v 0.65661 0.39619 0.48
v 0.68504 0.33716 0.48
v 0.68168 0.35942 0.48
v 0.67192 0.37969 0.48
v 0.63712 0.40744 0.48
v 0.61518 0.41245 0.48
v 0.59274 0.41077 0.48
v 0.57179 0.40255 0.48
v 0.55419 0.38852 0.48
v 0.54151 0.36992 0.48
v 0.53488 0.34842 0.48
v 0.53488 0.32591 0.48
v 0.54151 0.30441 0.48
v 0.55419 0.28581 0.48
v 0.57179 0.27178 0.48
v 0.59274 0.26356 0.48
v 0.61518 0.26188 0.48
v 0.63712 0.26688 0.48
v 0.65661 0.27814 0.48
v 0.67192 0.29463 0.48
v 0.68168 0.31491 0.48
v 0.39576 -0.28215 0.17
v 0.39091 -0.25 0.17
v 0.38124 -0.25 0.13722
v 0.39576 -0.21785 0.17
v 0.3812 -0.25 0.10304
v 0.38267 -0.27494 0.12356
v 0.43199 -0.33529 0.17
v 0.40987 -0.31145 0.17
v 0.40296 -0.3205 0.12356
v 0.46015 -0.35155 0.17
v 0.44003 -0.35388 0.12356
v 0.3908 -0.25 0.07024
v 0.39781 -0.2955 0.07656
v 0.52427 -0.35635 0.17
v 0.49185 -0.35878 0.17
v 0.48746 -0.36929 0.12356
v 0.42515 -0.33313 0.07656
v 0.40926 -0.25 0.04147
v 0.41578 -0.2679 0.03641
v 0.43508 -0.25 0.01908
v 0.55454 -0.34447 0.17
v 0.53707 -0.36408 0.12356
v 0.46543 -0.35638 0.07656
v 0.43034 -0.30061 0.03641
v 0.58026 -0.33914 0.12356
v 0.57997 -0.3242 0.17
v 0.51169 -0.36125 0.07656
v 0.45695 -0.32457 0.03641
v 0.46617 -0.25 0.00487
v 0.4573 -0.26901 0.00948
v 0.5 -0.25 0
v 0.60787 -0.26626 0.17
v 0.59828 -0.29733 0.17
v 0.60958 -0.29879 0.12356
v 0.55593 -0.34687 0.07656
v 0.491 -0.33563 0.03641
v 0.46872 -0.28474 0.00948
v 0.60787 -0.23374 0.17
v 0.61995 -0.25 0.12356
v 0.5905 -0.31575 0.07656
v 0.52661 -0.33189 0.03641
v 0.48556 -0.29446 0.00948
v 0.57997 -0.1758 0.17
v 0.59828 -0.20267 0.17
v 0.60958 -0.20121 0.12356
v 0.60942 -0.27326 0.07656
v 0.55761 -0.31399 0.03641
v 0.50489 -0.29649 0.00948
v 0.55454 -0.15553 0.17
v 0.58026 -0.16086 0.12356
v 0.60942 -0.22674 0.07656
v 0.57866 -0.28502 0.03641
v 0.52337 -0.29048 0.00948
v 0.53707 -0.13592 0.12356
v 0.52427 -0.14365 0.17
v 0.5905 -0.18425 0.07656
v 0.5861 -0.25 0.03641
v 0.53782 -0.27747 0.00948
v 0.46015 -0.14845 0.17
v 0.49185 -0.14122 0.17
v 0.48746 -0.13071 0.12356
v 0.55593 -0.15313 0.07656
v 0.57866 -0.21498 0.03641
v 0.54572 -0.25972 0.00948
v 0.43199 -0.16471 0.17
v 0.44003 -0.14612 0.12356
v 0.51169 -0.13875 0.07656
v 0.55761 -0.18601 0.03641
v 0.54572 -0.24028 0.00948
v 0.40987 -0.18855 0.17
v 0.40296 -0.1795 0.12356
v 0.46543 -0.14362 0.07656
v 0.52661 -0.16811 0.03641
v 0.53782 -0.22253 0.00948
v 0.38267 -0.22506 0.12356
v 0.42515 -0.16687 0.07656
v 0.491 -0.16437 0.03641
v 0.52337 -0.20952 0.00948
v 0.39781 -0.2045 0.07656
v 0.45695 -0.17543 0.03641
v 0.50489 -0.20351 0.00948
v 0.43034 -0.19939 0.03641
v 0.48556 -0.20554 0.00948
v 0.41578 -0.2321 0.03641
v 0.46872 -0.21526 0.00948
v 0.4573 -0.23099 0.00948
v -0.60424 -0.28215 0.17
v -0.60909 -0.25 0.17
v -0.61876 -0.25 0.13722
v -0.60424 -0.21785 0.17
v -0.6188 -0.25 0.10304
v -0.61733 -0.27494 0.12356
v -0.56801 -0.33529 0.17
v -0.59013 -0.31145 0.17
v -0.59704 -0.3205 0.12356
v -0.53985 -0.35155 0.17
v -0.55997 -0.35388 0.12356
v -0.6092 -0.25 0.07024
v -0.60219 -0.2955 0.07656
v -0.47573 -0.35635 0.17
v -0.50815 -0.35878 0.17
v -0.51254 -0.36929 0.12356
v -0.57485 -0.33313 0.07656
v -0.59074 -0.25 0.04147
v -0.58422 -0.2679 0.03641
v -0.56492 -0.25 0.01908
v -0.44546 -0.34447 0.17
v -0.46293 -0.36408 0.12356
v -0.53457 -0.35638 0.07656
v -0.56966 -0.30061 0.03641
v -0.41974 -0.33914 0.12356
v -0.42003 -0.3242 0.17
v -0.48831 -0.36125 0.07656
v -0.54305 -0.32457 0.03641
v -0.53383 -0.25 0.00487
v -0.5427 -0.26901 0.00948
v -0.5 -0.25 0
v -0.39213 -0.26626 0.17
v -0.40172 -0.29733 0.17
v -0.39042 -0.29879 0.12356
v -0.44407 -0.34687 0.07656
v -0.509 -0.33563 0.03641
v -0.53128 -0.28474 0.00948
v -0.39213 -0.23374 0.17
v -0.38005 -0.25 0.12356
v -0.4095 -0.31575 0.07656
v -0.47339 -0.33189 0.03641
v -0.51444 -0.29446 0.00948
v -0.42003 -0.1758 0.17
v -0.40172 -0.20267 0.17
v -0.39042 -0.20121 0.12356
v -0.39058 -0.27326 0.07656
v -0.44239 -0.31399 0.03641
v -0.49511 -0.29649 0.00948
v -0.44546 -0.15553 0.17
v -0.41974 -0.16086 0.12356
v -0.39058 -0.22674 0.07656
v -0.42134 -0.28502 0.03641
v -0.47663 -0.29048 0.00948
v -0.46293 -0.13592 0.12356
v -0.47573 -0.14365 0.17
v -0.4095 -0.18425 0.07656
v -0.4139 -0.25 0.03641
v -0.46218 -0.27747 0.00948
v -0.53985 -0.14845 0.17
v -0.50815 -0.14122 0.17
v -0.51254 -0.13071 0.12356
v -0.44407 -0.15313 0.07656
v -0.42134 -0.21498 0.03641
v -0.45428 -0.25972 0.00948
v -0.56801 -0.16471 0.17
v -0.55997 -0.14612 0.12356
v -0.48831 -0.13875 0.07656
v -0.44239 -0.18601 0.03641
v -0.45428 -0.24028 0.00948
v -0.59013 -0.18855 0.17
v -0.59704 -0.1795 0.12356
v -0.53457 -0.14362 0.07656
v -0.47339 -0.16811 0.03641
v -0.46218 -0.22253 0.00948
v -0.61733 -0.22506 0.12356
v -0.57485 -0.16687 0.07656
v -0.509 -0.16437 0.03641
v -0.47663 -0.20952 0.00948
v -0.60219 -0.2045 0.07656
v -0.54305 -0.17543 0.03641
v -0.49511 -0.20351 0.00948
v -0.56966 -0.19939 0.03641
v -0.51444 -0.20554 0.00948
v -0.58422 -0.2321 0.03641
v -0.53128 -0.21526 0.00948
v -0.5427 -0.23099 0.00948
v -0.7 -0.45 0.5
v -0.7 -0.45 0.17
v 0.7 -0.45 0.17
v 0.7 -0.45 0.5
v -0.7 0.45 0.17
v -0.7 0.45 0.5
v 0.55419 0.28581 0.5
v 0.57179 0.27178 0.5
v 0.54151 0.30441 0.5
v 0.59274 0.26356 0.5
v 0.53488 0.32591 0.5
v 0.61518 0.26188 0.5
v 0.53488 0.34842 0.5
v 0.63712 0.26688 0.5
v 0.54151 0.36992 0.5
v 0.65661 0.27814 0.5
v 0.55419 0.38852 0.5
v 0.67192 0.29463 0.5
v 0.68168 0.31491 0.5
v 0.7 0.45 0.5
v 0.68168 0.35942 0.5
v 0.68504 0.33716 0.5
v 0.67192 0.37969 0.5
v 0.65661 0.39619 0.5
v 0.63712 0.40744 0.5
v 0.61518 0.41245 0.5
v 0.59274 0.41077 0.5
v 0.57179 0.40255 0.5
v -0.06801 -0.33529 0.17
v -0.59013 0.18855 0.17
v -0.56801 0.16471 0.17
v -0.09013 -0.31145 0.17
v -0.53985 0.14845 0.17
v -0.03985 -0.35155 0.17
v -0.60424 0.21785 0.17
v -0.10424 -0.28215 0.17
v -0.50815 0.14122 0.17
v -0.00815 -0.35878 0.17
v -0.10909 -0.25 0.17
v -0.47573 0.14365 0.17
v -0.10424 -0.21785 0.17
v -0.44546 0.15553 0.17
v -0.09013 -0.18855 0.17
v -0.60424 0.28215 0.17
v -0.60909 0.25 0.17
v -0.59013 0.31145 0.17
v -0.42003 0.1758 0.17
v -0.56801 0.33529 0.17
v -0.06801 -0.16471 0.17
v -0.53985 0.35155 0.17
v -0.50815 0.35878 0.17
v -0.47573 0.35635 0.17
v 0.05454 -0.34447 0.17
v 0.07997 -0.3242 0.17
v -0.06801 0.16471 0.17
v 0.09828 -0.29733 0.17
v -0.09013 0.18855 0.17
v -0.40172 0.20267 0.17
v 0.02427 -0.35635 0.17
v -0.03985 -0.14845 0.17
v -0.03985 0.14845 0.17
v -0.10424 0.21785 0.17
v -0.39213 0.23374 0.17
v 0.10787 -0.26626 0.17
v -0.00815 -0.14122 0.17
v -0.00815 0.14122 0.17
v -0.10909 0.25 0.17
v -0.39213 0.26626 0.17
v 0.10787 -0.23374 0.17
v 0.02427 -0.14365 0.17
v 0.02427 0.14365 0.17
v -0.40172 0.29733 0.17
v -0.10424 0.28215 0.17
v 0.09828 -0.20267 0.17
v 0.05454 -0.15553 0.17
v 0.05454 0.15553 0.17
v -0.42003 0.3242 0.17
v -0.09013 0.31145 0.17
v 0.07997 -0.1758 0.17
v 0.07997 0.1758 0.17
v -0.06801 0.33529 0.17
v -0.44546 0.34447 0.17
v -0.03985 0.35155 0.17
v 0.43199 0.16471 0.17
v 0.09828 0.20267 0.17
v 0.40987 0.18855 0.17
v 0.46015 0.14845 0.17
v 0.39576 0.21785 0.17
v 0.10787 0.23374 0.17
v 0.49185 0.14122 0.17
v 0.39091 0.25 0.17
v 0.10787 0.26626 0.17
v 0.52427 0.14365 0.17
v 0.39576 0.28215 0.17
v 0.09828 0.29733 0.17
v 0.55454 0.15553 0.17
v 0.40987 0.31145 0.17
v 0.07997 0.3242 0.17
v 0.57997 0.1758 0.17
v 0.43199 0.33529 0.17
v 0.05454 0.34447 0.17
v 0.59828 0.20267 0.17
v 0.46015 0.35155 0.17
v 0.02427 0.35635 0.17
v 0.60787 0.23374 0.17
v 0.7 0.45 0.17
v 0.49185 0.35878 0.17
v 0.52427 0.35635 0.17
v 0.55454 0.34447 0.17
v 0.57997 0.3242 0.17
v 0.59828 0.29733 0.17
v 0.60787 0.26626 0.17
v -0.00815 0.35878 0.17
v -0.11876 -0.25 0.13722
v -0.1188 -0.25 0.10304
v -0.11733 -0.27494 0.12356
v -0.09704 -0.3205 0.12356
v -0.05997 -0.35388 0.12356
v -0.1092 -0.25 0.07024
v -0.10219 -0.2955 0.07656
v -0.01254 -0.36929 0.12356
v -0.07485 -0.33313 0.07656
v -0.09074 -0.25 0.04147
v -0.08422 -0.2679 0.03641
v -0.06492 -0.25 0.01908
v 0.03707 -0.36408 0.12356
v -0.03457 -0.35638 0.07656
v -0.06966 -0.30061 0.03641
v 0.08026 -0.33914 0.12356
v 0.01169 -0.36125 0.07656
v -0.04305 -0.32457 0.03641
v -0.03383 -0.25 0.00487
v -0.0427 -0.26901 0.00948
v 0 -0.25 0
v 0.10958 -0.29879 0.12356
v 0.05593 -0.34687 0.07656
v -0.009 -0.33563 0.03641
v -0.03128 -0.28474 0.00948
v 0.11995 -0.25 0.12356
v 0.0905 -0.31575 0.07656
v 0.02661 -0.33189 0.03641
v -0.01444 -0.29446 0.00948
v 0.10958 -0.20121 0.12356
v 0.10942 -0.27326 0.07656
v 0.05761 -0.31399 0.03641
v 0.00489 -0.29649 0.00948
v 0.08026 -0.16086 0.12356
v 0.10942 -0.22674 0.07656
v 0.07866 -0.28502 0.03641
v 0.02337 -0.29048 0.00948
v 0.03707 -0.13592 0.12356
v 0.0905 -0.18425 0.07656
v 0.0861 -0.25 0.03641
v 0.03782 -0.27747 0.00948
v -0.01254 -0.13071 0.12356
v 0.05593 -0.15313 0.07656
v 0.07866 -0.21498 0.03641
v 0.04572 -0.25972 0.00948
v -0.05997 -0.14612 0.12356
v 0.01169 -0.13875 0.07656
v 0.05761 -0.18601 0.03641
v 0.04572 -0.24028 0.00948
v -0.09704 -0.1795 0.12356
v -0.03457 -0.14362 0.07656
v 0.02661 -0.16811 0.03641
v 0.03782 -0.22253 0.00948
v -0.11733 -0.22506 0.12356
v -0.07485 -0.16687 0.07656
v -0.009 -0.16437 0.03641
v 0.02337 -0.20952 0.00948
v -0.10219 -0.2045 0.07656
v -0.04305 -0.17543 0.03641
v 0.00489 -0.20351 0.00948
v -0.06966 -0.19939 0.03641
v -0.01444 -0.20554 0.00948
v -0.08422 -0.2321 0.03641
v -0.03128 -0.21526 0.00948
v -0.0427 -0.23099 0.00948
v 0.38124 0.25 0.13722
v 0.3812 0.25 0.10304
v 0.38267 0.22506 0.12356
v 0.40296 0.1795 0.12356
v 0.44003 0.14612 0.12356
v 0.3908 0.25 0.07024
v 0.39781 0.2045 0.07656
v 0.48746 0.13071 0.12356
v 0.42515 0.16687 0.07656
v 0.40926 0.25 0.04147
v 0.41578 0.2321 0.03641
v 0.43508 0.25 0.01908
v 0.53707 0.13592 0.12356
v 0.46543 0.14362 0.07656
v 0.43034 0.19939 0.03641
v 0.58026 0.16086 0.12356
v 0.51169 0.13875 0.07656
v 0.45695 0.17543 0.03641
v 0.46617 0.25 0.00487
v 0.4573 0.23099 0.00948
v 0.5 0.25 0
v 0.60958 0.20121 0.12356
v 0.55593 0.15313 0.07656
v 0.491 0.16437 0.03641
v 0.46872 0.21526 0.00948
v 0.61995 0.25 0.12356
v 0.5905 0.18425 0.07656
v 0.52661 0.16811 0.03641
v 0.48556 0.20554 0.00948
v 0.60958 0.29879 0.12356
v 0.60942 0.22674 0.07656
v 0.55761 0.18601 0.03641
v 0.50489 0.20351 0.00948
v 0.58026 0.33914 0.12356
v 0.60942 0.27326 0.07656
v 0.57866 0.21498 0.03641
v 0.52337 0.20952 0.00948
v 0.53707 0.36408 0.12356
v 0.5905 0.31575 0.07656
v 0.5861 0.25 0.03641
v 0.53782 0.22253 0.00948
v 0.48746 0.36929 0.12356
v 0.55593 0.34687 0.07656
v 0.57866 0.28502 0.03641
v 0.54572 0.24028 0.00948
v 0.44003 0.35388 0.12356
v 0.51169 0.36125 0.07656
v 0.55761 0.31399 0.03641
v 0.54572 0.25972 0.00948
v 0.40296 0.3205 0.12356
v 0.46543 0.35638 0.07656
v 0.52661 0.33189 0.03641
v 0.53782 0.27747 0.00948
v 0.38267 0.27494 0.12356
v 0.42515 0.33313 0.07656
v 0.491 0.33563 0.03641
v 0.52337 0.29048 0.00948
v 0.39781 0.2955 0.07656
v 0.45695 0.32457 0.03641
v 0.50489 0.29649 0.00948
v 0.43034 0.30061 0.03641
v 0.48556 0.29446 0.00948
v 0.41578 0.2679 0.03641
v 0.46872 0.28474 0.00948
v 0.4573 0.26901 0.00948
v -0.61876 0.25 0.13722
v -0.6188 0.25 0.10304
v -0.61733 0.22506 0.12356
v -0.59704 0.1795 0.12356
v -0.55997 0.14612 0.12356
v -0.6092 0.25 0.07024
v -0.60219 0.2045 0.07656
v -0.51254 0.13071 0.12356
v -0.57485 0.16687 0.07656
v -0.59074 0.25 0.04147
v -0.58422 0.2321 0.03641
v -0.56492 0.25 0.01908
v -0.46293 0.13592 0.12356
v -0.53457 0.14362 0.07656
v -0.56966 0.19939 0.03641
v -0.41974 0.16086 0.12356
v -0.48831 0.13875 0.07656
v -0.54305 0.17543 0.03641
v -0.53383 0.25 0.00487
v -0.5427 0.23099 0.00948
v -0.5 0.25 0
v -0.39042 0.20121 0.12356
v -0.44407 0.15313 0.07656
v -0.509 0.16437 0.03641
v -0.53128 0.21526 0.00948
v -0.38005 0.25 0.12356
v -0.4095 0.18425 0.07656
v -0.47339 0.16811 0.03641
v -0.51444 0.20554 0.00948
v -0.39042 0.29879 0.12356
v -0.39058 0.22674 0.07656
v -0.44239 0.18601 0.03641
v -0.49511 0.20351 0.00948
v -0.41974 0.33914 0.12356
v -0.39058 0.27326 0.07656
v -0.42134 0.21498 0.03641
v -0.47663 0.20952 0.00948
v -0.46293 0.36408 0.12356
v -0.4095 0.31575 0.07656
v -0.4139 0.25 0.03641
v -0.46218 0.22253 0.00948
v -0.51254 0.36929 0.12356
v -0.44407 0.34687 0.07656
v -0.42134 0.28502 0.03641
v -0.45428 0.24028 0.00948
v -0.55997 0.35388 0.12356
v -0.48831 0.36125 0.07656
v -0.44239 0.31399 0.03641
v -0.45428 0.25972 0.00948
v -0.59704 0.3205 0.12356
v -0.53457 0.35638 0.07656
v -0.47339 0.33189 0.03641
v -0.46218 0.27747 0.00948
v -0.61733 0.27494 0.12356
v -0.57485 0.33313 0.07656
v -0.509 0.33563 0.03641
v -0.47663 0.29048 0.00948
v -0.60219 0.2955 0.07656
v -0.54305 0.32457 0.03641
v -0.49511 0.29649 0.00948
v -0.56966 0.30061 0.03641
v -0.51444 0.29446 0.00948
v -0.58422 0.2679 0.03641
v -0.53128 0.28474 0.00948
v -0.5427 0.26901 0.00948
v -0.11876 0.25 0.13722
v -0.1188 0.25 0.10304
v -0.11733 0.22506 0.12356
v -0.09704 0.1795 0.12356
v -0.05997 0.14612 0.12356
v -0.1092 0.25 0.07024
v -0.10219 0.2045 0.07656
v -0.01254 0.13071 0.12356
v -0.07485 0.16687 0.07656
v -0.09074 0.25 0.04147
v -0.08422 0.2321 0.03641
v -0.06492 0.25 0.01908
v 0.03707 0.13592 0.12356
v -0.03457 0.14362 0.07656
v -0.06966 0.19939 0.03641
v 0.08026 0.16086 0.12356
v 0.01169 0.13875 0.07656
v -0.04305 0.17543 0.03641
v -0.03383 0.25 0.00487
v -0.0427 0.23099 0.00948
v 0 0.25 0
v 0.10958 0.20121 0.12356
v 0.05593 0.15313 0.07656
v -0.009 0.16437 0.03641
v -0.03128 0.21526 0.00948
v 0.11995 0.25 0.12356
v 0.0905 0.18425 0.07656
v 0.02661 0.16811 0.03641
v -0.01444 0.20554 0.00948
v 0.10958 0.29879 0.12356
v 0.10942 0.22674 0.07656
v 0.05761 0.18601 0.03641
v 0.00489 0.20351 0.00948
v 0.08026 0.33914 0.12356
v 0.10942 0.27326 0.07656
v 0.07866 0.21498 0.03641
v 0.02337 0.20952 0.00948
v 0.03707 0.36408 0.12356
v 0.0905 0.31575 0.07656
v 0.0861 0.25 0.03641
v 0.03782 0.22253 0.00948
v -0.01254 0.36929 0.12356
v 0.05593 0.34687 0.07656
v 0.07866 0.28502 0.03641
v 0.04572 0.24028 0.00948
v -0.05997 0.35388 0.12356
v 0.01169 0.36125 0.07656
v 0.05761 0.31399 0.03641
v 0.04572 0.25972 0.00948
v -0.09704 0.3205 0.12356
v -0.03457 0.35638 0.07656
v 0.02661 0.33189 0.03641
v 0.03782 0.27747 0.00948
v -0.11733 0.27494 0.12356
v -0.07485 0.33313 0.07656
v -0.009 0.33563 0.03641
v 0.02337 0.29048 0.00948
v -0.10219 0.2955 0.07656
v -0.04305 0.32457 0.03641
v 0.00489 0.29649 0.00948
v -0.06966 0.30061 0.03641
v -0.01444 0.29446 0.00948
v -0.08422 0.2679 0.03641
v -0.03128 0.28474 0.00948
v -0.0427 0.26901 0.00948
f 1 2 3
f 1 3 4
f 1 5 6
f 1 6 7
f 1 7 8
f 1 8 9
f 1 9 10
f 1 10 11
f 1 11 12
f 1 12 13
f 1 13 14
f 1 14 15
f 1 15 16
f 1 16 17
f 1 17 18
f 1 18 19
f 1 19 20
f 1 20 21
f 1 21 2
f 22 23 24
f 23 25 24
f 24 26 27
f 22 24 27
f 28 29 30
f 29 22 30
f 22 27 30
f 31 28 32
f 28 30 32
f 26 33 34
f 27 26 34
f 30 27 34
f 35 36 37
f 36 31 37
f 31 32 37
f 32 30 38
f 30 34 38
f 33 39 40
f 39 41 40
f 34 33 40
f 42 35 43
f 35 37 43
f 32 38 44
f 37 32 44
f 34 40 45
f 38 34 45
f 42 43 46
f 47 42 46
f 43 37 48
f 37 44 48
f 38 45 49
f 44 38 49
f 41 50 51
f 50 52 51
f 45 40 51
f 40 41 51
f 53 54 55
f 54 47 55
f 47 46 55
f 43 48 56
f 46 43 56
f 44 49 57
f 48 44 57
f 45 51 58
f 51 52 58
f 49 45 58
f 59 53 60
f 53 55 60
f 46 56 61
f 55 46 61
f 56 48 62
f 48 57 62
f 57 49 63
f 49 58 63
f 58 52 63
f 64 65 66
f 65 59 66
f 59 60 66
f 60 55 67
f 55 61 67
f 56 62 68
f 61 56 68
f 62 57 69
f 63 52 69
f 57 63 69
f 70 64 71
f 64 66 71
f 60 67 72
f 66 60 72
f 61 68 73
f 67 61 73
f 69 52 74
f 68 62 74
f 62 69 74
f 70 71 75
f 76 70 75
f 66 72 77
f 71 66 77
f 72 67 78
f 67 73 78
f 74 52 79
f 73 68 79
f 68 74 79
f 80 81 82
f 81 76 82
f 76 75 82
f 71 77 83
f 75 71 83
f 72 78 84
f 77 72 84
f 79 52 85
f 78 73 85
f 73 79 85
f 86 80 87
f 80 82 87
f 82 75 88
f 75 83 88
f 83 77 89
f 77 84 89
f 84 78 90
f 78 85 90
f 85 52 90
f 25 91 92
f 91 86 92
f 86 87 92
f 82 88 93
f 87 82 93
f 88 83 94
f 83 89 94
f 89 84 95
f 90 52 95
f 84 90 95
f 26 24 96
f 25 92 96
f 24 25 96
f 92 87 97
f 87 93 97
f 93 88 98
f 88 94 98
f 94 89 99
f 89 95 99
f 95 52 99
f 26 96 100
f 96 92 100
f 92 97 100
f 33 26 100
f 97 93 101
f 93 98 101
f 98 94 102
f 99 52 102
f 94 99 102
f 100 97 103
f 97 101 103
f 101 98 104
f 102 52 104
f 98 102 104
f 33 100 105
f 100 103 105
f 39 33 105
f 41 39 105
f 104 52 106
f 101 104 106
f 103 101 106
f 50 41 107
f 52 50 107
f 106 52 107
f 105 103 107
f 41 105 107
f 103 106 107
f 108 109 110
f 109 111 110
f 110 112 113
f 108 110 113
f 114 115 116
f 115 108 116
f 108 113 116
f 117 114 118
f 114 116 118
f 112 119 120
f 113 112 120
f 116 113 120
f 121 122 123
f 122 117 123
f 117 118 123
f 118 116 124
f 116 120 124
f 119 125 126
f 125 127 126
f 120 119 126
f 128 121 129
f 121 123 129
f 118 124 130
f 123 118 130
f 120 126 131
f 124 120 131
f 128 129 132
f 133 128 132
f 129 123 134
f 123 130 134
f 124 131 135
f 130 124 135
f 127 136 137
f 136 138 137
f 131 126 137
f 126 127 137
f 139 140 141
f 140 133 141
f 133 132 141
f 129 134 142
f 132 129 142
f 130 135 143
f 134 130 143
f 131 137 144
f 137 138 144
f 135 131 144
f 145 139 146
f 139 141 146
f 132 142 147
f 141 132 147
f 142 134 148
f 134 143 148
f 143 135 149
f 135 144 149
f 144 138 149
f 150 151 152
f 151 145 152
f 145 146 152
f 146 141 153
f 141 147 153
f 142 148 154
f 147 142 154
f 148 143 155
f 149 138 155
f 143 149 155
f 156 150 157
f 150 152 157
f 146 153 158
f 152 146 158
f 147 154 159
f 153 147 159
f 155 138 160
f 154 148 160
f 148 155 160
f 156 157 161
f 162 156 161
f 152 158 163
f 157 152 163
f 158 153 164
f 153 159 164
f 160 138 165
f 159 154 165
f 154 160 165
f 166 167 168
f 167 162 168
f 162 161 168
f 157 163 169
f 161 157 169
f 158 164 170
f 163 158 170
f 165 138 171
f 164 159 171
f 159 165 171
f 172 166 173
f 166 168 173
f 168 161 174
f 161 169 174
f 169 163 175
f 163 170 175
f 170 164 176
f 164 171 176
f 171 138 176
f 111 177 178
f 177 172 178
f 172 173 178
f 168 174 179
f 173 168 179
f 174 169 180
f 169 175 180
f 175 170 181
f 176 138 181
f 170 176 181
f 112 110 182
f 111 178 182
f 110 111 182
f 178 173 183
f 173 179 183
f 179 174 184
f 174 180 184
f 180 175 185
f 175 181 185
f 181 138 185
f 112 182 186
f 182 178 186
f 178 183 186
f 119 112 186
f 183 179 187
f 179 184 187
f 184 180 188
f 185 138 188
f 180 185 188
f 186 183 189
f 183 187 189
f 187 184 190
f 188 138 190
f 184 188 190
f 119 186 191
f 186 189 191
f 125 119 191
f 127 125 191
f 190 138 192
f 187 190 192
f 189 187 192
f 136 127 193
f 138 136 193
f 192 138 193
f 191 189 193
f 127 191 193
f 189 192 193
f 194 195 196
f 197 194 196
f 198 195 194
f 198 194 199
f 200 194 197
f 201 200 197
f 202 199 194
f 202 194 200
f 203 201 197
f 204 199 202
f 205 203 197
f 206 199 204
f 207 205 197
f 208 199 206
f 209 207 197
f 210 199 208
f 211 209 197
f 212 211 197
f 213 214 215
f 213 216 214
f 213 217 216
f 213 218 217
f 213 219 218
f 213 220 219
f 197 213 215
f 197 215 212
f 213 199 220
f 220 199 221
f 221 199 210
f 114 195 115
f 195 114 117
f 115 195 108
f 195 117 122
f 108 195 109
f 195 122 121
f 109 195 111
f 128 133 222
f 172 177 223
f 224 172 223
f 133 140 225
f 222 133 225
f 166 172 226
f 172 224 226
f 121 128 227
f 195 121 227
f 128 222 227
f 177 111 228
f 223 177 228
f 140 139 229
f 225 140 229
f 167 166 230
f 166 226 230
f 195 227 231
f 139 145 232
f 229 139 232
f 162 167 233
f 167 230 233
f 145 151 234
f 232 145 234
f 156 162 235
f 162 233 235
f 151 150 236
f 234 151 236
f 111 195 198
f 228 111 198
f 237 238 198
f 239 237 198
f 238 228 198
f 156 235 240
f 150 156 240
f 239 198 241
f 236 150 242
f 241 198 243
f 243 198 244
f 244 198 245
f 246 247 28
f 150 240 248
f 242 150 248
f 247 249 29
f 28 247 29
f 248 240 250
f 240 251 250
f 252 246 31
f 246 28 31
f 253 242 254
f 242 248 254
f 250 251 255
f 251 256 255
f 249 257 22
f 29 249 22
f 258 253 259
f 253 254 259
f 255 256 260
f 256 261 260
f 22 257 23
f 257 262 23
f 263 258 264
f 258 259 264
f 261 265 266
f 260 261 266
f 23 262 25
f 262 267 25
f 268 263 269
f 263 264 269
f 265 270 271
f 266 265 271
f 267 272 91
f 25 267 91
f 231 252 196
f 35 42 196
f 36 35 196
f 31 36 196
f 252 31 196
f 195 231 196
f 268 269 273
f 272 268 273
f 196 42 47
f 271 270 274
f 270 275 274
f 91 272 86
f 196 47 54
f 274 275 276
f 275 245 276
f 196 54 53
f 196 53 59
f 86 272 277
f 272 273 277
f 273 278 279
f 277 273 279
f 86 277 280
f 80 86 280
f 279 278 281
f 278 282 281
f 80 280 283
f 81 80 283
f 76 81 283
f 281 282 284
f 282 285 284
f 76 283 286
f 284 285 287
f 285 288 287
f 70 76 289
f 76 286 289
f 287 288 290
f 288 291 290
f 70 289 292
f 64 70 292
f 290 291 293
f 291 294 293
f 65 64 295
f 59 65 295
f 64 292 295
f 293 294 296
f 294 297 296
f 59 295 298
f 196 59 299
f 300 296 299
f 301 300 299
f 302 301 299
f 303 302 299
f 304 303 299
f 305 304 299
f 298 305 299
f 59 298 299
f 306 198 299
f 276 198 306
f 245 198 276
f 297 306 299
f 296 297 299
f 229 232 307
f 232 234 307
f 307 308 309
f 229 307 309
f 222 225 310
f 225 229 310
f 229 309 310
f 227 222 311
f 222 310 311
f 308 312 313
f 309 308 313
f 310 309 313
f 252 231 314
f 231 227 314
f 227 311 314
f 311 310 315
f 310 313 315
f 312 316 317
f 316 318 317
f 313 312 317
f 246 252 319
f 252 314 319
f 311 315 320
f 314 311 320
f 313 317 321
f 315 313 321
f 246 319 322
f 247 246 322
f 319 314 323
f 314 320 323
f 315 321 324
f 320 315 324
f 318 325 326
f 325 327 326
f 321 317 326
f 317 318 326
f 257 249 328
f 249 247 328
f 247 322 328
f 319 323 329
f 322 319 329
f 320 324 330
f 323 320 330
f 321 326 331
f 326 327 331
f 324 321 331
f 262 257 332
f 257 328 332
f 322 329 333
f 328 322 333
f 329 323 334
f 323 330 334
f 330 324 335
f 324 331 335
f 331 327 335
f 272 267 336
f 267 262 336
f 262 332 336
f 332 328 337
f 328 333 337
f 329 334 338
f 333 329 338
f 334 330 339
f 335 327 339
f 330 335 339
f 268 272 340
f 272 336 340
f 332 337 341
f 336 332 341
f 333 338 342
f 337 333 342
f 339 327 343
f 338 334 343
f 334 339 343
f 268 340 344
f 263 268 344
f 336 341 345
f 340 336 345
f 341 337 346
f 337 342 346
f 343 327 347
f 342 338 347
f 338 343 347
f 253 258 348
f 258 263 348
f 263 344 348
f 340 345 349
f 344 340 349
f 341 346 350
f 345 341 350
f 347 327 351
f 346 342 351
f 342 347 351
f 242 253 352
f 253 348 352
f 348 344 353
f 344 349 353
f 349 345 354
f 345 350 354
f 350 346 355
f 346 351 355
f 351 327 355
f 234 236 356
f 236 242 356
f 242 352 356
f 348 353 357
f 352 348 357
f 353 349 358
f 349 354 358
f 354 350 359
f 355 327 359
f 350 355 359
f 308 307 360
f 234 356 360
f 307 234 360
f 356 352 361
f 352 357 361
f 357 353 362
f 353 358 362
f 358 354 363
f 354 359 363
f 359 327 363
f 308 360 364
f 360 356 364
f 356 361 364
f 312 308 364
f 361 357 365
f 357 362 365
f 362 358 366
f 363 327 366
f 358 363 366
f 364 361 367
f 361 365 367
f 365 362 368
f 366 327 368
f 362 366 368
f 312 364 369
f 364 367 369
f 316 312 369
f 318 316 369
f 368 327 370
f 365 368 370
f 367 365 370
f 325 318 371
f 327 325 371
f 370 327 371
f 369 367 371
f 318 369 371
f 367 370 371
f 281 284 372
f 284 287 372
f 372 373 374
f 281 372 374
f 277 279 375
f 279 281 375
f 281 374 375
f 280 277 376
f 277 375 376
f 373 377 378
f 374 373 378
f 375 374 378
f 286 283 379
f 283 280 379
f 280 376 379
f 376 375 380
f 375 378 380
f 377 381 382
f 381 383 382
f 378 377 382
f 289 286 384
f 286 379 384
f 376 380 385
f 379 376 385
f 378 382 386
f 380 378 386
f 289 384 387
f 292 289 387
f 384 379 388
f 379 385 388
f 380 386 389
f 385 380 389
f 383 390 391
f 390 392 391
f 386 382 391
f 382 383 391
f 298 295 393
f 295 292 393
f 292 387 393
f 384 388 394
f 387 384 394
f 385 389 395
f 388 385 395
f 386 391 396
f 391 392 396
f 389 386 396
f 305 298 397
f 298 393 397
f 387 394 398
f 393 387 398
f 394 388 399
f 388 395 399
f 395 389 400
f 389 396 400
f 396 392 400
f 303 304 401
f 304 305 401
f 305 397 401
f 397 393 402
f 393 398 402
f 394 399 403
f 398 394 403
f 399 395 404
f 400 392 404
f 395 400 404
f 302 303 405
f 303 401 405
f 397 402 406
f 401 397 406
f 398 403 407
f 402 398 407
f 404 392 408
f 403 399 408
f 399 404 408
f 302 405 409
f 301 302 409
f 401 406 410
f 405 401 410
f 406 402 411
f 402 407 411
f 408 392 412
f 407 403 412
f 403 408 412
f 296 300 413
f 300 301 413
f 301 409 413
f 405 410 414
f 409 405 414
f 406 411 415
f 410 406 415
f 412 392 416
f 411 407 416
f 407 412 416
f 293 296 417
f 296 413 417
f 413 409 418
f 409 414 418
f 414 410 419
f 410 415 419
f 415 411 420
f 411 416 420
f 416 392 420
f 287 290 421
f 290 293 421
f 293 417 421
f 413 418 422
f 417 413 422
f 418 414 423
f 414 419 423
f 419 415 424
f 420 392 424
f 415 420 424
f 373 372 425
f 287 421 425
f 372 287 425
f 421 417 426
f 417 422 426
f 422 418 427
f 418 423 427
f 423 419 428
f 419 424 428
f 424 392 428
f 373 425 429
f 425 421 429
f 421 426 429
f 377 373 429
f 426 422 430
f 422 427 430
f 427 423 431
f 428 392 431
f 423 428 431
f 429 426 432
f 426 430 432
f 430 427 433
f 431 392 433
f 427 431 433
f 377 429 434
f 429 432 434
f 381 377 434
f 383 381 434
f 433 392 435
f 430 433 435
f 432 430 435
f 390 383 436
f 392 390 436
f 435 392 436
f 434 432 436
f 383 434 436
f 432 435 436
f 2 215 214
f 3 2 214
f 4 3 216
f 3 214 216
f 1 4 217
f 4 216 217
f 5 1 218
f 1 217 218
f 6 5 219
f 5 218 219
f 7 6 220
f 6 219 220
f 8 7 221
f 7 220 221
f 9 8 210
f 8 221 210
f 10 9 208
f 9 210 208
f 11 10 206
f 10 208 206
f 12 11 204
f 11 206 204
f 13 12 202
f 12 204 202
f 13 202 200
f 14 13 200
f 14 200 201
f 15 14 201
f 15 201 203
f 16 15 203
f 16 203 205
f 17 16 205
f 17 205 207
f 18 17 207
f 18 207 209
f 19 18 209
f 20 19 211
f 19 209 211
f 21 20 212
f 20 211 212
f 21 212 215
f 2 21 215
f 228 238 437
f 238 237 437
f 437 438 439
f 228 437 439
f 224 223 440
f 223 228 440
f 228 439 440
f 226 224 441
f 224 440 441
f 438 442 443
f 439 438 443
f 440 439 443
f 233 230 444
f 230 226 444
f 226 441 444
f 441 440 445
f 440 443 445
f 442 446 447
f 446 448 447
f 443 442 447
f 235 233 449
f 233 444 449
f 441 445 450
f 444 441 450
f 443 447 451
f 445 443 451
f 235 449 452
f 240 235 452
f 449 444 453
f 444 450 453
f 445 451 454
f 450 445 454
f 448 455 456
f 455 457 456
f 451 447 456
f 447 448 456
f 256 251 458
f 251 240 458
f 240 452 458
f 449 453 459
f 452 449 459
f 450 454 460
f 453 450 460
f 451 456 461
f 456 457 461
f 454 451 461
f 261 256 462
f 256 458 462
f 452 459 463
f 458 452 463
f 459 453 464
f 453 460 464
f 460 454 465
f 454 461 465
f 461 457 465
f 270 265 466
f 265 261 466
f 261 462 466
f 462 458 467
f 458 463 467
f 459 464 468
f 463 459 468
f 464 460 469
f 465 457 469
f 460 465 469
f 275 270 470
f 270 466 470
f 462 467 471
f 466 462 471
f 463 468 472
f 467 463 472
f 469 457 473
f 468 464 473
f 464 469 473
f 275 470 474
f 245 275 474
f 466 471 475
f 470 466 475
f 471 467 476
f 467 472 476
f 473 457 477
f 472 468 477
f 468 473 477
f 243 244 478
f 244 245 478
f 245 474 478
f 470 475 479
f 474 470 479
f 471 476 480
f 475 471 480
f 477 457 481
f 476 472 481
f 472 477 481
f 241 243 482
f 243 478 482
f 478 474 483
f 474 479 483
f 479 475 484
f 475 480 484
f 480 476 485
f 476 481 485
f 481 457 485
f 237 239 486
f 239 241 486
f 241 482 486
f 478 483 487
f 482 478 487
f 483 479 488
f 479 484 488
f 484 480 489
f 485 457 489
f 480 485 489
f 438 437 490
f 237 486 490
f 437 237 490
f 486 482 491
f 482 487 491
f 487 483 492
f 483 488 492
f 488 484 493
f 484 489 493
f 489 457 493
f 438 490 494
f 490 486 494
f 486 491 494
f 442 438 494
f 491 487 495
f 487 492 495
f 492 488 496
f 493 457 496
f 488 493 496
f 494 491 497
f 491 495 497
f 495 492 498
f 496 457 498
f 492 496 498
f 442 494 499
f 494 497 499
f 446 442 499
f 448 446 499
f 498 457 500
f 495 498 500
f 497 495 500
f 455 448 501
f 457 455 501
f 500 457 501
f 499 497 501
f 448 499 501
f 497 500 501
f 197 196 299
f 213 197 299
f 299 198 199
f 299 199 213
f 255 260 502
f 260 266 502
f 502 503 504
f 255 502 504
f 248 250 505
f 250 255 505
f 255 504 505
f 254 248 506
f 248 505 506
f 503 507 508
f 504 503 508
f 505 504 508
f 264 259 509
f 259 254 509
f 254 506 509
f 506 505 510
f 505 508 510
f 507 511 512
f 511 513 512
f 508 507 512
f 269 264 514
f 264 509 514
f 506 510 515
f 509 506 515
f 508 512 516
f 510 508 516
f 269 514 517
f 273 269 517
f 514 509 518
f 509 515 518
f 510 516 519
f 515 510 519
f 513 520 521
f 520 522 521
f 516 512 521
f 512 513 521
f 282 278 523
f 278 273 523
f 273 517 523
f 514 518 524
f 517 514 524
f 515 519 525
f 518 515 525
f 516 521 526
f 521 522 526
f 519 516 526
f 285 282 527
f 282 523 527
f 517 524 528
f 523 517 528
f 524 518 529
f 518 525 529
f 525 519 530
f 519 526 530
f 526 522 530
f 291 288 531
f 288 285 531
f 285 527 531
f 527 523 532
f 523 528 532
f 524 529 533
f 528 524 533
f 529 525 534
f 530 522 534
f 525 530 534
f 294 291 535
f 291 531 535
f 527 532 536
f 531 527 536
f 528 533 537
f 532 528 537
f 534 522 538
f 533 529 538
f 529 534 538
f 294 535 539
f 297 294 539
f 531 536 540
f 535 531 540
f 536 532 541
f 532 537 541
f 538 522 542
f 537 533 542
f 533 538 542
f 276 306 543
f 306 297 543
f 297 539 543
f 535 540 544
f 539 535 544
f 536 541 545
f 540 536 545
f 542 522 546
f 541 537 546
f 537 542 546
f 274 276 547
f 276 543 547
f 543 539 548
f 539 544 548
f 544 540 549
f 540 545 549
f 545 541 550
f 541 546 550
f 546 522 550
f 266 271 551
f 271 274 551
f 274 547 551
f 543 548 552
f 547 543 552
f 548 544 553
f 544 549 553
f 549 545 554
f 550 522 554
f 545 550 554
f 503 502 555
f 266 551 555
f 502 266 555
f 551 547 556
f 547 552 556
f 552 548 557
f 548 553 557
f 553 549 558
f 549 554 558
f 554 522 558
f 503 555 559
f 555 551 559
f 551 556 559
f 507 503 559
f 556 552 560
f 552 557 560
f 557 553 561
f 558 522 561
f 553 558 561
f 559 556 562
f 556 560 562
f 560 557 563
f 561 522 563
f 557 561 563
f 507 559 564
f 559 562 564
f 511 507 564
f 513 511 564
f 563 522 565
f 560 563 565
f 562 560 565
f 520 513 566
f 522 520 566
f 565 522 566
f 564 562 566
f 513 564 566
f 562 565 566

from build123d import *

# Parameters (mm, degrees)
BOSS_EXTRUDE1_START  = 0.17
SKETCH1_W            = 1.4
SKETCH1_H            = 0.9
BOSS_EXTRUDE1_DEPTH  = 0.33
LPATTERN1_COUNT      = 3
LPATTERN1_PITCH      = 0.5
LPATTERN1_COUNT_DIR2 = 2
LPATTERN1_PITCH_DIR2 = 0.5
SKETCH3_R            = 0.075498707
CUT_EXTRUDE1_DEPTH   = 0.02


with BuildPart() as part:
    # Sketch1 → Boss-Extrude1 (new body)
    with BuildSketch(Plane.XY.offset(BOSS_EXTRUDE1_START)):
        Rectangle(SKETCH1_W, SKETCH1_H)
    extrude(amount=BOSS_EXTRUDE1_DEPTH)

    # Sketch2 → Revolve1 (revolve)
    with BuildSketch(Plane(origin=(0, 0.25, 0), x_dir=(1, 0, 0), z_dir=(0, 1, 0))):
        with BuildLine():
            Line((-0.5, 0), (-0.5, -0.24))
            ThreePointArc((-0.5, -0.24), (-0.62, -0.12), (-0.5, 0))
        make_face()
    revolve1 = revolve(axis=Axis((-0.5, 0.25, 0), (0, 0, 1)))

    # LPattern1: Revolve1 3 × 2
    with Locations(*[(i * LPATTERN1_PITCH, -j * LPATTERN1_PITCH_DIR2, 0) for i in range(LPATTERN1_COUNT) for j in range(LPATTERN1_COUNT_DIR2) if (i, j) != (0, 0)]):
        add(revolve1)

    # Sketch3 → Cut-Extrude1 (cut)
    with BuildSketch(Plane.XY.offset(0.5)):
        with Locations((0.609536705, 0.337163061)):
            Circle(SKETCH3_R)
    extrude(amount=-CUT_EXTRUDE1_DEPTH, mode=Mode.SUBTRACT)


solid = part.part
